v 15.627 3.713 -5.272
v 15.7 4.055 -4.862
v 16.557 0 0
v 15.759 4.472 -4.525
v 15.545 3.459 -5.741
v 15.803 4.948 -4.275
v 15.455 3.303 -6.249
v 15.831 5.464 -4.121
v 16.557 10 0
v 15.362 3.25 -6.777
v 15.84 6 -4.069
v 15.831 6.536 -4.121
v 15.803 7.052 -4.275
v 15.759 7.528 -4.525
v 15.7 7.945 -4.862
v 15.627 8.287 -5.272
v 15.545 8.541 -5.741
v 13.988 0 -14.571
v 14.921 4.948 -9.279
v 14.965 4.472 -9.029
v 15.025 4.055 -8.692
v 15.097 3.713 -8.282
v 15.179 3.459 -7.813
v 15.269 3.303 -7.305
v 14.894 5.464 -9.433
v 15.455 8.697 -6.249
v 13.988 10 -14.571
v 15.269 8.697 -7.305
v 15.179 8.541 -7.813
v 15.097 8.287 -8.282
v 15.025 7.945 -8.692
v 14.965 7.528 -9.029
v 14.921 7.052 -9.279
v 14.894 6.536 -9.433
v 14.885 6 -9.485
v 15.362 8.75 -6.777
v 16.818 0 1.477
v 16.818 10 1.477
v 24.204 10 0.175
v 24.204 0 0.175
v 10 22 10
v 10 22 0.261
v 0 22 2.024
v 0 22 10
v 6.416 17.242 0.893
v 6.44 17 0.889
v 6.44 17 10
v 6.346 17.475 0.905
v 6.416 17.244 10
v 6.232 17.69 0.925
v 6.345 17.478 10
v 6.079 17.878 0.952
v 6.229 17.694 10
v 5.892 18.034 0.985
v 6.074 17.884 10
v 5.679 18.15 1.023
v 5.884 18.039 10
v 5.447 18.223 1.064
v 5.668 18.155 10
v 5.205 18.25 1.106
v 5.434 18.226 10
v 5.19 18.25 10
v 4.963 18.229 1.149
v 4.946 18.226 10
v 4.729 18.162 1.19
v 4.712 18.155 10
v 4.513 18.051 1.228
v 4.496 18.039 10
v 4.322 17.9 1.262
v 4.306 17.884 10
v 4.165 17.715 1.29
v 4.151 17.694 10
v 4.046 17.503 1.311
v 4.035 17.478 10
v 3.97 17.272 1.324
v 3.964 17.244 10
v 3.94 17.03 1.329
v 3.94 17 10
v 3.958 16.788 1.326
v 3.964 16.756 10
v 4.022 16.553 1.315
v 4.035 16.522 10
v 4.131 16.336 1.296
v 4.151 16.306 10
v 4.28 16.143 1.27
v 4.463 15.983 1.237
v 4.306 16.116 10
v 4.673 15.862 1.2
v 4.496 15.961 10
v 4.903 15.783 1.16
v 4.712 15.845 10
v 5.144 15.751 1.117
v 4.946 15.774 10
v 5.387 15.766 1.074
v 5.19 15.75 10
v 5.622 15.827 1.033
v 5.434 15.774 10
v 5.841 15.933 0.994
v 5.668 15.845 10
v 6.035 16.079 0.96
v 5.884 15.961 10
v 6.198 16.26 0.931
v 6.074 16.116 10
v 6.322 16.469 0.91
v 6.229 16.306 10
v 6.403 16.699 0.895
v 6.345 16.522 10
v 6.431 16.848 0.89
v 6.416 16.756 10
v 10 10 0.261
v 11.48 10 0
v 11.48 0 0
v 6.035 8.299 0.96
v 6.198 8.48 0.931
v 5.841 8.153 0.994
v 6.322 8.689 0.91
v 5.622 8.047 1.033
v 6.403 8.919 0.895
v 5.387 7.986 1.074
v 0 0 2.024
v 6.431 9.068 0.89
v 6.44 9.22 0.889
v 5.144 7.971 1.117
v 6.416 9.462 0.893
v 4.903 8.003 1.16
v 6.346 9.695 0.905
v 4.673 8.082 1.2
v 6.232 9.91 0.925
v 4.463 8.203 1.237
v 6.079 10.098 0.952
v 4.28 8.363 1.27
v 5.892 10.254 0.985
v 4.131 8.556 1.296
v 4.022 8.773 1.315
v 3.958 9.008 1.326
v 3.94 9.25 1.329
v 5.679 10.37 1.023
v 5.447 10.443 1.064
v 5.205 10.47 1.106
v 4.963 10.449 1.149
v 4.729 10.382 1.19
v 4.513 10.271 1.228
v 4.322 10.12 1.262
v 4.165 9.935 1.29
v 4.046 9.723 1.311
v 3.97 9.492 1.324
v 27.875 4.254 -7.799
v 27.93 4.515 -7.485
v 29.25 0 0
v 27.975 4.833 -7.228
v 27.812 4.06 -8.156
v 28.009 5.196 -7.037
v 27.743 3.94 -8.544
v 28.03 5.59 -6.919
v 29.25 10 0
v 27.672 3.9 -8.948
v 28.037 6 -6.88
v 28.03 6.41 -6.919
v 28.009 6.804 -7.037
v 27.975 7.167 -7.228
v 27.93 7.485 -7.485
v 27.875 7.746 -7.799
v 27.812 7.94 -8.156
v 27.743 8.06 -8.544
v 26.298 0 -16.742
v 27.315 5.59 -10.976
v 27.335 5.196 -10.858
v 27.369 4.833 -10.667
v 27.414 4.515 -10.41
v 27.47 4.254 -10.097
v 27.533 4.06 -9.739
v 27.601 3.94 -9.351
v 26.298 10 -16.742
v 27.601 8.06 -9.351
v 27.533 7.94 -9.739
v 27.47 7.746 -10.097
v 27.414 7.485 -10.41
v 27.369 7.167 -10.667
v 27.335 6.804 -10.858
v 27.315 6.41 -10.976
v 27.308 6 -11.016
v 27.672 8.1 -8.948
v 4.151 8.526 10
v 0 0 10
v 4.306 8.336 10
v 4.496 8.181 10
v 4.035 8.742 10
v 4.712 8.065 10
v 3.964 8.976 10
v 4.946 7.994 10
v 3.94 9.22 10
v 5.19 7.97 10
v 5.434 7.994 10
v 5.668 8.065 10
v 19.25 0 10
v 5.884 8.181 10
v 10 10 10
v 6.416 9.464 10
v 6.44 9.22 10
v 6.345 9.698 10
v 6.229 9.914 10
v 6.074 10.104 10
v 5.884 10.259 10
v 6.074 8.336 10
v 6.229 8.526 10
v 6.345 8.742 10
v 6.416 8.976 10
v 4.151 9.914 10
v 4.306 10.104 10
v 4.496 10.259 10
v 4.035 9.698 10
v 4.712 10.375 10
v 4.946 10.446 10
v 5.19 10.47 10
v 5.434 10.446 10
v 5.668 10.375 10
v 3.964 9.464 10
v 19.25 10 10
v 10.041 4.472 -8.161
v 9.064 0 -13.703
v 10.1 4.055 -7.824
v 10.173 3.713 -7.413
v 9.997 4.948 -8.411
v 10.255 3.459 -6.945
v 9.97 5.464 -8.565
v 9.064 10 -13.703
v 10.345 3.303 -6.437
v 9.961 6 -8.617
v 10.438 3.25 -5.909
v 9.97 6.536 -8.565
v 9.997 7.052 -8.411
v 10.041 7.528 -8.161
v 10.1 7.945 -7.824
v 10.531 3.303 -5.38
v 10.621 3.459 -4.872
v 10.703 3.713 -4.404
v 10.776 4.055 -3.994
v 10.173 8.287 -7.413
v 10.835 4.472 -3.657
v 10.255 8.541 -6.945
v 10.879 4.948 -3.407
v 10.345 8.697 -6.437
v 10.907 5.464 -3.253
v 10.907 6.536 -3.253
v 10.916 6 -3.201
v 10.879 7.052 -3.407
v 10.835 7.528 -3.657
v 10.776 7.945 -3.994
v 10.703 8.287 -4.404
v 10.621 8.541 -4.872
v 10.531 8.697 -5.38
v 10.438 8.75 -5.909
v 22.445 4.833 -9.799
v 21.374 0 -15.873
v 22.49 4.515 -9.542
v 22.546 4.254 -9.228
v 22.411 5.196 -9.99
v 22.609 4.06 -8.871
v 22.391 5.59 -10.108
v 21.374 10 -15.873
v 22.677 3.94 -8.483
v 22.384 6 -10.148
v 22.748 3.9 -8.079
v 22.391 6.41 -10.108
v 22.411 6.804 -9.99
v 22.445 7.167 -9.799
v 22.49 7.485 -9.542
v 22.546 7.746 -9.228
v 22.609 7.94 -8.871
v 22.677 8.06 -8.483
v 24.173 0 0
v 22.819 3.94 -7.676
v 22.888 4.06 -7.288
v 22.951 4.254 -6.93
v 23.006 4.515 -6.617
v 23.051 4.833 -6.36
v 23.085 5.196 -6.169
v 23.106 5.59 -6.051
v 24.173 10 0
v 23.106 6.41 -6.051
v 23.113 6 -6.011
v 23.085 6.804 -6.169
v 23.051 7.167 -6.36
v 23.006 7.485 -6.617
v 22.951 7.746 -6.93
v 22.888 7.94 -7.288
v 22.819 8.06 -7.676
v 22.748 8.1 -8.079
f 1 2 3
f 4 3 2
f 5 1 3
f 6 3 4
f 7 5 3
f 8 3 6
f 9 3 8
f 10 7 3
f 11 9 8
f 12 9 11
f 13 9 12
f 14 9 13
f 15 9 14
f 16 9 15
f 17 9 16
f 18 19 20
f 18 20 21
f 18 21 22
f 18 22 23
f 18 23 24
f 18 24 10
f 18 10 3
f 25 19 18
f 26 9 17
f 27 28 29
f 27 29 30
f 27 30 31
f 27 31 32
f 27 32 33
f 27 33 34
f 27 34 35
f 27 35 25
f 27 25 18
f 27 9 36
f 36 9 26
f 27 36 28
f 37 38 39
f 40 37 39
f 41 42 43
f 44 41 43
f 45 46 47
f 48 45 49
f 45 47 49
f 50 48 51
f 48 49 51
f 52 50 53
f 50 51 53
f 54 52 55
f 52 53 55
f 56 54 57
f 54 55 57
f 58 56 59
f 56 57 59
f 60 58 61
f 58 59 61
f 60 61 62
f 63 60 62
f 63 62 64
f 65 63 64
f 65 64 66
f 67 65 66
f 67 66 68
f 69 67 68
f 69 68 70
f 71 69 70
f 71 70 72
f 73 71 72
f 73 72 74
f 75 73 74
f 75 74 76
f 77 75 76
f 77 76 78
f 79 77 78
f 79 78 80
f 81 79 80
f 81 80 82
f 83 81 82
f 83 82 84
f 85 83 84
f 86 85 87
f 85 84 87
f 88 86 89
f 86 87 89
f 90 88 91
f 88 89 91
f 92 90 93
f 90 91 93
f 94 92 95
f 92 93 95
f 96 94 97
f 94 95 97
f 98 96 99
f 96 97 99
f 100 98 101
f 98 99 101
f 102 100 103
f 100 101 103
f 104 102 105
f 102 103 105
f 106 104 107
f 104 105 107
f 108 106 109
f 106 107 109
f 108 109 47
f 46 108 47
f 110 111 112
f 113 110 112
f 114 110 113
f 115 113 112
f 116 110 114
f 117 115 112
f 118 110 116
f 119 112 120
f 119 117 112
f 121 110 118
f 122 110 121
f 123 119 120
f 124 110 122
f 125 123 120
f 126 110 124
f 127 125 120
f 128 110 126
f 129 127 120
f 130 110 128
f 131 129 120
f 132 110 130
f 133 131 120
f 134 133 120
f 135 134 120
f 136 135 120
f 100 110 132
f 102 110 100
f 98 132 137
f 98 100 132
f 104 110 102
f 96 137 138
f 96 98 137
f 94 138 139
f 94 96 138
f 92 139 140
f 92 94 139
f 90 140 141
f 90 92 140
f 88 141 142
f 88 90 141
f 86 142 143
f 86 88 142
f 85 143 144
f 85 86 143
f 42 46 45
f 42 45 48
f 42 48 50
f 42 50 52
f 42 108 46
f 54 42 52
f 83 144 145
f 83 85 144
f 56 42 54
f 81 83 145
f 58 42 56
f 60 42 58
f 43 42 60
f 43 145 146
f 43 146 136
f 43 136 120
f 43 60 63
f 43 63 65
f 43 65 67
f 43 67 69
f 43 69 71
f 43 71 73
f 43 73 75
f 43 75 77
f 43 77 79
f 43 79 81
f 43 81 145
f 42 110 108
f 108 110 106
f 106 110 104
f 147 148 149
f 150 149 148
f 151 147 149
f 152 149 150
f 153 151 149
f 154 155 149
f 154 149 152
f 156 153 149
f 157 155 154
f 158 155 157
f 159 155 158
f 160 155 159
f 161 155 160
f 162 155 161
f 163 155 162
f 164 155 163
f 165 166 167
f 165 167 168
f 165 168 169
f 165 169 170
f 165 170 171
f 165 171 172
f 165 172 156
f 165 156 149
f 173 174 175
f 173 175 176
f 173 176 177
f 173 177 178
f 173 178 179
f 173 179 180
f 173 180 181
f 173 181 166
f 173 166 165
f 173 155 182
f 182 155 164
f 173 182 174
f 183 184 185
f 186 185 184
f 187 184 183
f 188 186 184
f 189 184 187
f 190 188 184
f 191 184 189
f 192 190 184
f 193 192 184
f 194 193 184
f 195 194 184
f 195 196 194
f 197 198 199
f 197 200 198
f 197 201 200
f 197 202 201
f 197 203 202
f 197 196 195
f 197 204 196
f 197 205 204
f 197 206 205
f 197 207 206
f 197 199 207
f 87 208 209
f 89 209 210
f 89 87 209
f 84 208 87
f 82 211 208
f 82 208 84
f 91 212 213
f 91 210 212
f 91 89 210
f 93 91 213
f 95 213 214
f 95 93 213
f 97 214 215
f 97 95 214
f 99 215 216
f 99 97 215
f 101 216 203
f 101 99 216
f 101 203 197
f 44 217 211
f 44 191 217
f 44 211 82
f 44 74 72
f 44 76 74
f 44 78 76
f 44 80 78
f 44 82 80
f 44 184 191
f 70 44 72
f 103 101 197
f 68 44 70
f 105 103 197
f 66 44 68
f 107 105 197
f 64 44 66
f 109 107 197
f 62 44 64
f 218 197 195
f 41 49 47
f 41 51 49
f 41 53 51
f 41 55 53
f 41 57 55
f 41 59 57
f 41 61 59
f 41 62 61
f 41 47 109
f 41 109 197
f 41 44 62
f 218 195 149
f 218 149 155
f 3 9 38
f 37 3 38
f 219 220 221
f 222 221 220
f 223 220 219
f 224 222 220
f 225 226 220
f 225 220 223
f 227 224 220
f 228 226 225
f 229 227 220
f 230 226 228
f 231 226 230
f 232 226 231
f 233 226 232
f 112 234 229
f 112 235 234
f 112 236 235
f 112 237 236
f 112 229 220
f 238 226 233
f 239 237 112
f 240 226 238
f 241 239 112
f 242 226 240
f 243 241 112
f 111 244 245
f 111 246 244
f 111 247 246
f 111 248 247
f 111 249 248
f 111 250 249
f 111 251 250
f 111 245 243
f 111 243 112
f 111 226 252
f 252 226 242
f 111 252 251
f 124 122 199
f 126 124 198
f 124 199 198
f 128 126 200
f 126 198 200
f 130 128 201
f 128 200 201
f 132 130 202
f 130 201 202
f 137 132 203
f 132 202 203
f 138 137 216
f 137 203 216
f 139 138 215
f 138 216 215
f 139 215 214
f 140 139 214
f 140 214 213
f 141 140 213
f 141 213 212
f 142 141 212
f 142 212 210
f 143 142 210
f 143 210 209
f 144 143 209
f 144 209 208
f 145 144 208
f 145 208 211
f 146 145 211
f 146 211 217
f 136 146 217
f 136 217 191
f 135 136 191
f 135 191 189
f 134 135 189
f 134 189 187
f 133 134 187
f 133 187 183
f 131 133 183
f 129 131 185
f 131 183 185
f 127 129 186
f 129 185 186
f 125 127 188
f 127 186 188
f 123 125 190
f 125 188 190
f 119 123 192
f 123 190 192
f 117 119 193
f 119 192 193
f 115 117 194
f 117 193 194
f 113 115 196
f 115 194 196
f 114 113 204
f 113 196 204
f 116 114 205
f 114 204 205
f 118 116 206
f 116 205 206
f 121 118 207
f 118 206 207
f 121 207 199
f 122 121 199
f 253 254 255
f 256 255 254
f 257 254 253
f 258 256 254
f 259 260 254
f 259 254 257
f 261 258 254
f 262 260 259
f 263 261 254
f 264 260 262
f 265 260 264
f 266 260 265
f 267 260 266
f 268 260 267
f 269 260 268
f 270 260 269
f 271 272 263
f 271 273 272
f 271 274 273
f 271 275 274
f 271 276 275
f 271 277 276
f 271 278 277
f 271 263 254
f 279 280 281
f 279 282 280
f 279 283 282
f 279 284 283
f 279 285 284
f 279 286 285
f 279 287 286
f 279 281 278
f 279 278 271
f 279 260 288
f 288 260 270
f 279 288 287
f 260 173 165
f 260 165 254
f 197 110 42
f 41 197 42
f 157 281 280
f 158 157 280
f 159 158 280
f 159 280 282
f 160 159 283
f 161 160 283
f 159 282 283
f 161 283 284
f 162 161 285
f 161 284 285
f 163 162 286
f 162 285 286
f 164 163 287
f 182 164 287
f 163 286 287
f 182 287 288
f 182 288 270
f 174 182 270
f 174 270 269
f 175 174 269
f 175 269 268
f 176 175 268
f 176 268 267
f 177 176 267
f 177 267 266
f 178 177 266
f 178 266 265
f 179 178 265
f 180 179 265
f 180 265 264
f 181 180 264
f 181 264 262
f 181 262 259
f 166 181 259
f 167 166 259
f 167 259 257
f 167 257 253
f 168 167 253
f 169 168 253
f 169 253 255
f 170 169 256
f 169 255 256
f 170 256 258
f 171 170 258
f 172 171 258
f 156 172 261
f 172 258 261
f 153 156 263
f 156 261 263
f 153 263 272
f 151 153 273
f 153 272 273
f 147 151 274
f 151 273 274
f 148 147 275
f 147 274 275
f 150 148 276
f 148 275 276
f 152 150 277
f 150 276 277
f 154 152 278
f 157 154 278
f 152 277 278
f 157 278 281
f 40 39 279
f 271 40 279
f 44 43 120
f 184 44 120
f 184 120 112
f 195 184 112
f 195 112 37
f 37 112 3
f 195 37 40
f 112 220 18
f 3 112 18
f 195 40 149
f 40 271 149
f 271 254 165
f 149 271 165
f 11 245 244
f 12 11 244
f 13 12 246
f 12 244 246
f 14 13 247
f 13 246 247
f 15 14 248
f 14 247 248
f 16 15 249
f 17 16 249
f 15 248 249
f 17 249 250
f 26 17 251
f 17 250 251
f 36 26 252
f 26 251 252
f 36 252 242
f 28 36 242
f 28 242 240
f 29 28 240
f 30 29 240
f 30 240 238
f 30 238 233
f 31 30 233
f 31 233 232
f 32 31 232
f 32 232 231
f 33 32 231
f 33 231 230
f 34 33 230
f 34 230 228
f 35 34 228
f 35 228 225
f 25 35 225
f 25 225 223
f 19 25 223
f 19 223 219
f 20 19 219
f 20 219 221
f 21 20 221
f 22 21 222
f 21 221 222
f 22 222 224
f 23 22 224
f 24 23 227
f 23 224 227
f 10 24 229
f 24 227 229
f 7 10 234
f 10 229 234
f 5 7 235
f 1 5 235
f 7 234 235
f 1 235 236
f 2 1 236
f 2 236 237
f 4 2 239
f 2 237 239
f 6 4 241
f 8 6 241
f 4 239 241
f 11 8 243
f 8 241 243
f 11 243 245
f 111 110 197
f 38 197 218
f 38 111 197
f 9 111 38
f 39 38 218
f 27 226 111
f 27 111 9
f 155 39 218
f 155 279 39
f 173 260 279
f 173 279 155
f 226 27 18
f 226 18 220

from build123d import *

# Parameters (mm, degrees)
BOSS_EXTRU_1_DEPTH      = 10
BOSS_EXTRU_2_DEPTH      = 10
ENL_V_MAT_EXTRU_1_REACH = 37.775
ENL_V_MAT_EXTRU_2_REACH = 34.103
ESQUISSE4_R             = 2.75
ENL_V_MAT_EXTRU_3_REACH = 37.12
ESQUISSE5_R             = 2.1
CHANFREIN1_SIZE         = 10
ENL_V_MAT_EXTRU_4_REACH = 42.247
ENL_V_MAT_EXTRU_5_REACH = 47.329
ESQUISSE7_R             = 1.25


with BuildPart() as part:
    # Esquisse1 → Boss.-Extru.1 (new body)
    with BuildSketch(Plane.XY):
        Polygon((0, 0), (29.25, 0), (29.25, 10), (10, 10), (10, 22), (0, 22), align=None)
    extrude(amount=BOSS_EXTRU_1_DEPTH)

    # Esquisse2 → Boss.-Extru.2 (add)
    with BuildSketch(Plane(origin=(0, 10, 0), x_dir=(1, 0, 0), z_dir=(0, 1, 0))):
        Polygon((29.25, 0), (26.29798098, 16.741731801), (21.373942215, 15.873490913), (24.172866941, 0), align=None)
        Polygon((16.557167351, 0), (13.987884067, 14.57112958), (9.063845302, 13.702888692), (11.480034292, 0), align=None)
    extrude(amount=-BOSS_EXTRU_2_DEPTH)

    # Esquisse3 → Enlèv. mat.-Extru.1 (cut, up to next)
    with BuildSketch(Plane(origin=(0, 10, 0), x_dir=(1, 0, 0), z_dir=(0, 1, 0)), mode=Mode.PRIVATE) as enl_v_mat_extru_1_sk1:
        Polygon((16.557167351, 0), (16.817639618, -1.47721163), (24.203697766, -0.174850297), (24.172866941, 0), align=None)
    enl_v_mat_extru_1_tool1 = extrude(enl_v_mat_extru_1_sk1.sketch, amount=-ENL_V_MAT_EXTRU_1_REACH, mode=Mode.PRIVATE) & part.part
    add(enl_v_mat_extru_1_tool1.solids().sort_by_distance((19.452321, 10, 0.498572))[0], mode=Mode.SUBTRACT)

    # Esquisse4 → Enlèv. mat.-Extru.2 (cut, up to next)
    with BuildSketch(Plane(origin=(11.133868901, 0, -1.963201487), x_dir=(0.1736481776669311, 0, 0.9848077530122079), z_dir=(-0.9848077530122079, 0, 0.1736481776669311)), mode=Mode.PRIVATE) as enl_v_mat_extru_2_sk1:
        with Locations((-4.006512966, 6)):
            Circle(ESQUISSE4_R)
    enl_v_mat_extru_2_tool1 = extrude(enl_v_mat_extru_2_sk1.sketch, amount=-ENL_V_MAT_EXTRU_2_REACH, mode=Mode.PRIVATE) & part.part
    add(enl_v_mat_extru_2_tool1.solids().sort_by_distance((10.438145, 6, -5.908847))[0], mode=Mode.SUBTRACT)

    # Esquisse5 → Enlèv. mat.-Extru.3 (cut, up to next)
    with BuildSketch(Plane(origin=(23.443965814, 0, -4.133803708), x_dir=(0.1736481776669306, 0, 0.9848077530122081), z_dir=(-0.9848077530122081, 0, 0.1736481776669306)), mode=Mode.PRIVATE) as enl_v_mat_extru_3_sk1:
        with Locations((-4.006512966, 6)):
            Circle(ESQUISSE5_R)
    enl_v_mat_extru_3_tool1 = extrude(enl_v_mat_extru_3_sk1.sketch, amount=-ENL_V_MAT_EXTRU_3_REACH, mode=Mode.PRIVATE) & part.part
    add(enl_v_mat_extru_3_tool1.solids().sort_by_distance((22.748242, 6, -8.079449))[0], mode=Mode.SUBTRACT)

    # Chanfrein1
    chanfrein1_edges = [part.edges().sort_by_distance(p)[0] for p in [
        (29.25, 5, 10),
    ]]
    chamfer(chanfrein1_edges, length=CHANFREIN1_SIZE - 0.0001)  # a hair under: the kernel refuses the full size

    # Esquisse6 → Enlèv. mat.-Extru.4 (cut, up to next)
    with BuildSketch(Plane(origin=(0, 22, 0), x_dir=(1, 0, 0), z_dir=(0, 1, 0)), mode=Mode.PRIVATE) as enl_v_mat_extru_4_sk1:
        Polygon((0, 0), (11.480034292, 0), (0, -2.024239785), align=None)
    enl_v_mat_extru_4_tool1 = extrude(enl_v_mat_extru_4_sk1.sketch, amount=-ENL_V_MAT_EXTRU_4_REACH, mode=Mode.PRIVATE) & part.part
    add(enl_v_mat_extru_4_tool1.solids().sort_by_distance((3.826678, 22, 0.674747))[0], mode=Mode.SUBTRACT)

    # Enlèv. mat.-Extru.5: up to this plane
    enl_v_mat_extru_5_end = Plane(origin=(11.480034292, -0.001, 0), z_dir=(0.1736481776669316, 0, 0.9848077530122079))
    # Esquisse7 → Enlèv. mat.-Extru.5 (cut, up to the surface)
    with BuildSketch(Plane.XY.offset(10), mode=Mode.PRIVATE) as enl_v_mat_extru_5_sk1:
        with Locations((5.19, 17)):
            Circle(ESQUISSE7_R)
    enl_v_mat_extru_5_tool1 = split(extrude(enl_v_mat_extru_5_sk1.sketch, amount=-ENL_V_MAT_EXTRU_5_REACH, mode=Mode.PRIVATE), bisect_by=enl_v_mat_extru_5_end, keep=Keep.BOTH, mode=Mode.PRIVATE)
    add(enl_v_mat_extru_5_tool1.solids().sort_by_distance((5.19, 17, 10))[0], mode=Mode.SUBTRACT)
    # Esquisse7 → Enlèv. mat.-Extru.5 (cut, up to the surface)
    with BuildSketch(Plane.XY.offset(10), mode=Mode.PRIVATE) as enl_v_mat_extru_5_sk2:
        with Locations((5.19, 9.22)):
            Circle(ESQUISSE7_R)
    enl_v_mat_extru_5_tool2 = split(extrude(enl_v_mat_extru_5_sk2.sketch, amount=-ENL_V_MAT_EXTRU_5_REACH, mode=Mode.PRIVATE), bisect_by=enl_v_mat_extru_5_end, keep=Keep.BOTH, mode=Mode.PRIVATE)
    add(enl_v_mat_extru_5_tool2.solids().sort_by_distance((5.19, 9.22, 10))[0], mode=Mode.SUBTRACT)


solid = part.part
